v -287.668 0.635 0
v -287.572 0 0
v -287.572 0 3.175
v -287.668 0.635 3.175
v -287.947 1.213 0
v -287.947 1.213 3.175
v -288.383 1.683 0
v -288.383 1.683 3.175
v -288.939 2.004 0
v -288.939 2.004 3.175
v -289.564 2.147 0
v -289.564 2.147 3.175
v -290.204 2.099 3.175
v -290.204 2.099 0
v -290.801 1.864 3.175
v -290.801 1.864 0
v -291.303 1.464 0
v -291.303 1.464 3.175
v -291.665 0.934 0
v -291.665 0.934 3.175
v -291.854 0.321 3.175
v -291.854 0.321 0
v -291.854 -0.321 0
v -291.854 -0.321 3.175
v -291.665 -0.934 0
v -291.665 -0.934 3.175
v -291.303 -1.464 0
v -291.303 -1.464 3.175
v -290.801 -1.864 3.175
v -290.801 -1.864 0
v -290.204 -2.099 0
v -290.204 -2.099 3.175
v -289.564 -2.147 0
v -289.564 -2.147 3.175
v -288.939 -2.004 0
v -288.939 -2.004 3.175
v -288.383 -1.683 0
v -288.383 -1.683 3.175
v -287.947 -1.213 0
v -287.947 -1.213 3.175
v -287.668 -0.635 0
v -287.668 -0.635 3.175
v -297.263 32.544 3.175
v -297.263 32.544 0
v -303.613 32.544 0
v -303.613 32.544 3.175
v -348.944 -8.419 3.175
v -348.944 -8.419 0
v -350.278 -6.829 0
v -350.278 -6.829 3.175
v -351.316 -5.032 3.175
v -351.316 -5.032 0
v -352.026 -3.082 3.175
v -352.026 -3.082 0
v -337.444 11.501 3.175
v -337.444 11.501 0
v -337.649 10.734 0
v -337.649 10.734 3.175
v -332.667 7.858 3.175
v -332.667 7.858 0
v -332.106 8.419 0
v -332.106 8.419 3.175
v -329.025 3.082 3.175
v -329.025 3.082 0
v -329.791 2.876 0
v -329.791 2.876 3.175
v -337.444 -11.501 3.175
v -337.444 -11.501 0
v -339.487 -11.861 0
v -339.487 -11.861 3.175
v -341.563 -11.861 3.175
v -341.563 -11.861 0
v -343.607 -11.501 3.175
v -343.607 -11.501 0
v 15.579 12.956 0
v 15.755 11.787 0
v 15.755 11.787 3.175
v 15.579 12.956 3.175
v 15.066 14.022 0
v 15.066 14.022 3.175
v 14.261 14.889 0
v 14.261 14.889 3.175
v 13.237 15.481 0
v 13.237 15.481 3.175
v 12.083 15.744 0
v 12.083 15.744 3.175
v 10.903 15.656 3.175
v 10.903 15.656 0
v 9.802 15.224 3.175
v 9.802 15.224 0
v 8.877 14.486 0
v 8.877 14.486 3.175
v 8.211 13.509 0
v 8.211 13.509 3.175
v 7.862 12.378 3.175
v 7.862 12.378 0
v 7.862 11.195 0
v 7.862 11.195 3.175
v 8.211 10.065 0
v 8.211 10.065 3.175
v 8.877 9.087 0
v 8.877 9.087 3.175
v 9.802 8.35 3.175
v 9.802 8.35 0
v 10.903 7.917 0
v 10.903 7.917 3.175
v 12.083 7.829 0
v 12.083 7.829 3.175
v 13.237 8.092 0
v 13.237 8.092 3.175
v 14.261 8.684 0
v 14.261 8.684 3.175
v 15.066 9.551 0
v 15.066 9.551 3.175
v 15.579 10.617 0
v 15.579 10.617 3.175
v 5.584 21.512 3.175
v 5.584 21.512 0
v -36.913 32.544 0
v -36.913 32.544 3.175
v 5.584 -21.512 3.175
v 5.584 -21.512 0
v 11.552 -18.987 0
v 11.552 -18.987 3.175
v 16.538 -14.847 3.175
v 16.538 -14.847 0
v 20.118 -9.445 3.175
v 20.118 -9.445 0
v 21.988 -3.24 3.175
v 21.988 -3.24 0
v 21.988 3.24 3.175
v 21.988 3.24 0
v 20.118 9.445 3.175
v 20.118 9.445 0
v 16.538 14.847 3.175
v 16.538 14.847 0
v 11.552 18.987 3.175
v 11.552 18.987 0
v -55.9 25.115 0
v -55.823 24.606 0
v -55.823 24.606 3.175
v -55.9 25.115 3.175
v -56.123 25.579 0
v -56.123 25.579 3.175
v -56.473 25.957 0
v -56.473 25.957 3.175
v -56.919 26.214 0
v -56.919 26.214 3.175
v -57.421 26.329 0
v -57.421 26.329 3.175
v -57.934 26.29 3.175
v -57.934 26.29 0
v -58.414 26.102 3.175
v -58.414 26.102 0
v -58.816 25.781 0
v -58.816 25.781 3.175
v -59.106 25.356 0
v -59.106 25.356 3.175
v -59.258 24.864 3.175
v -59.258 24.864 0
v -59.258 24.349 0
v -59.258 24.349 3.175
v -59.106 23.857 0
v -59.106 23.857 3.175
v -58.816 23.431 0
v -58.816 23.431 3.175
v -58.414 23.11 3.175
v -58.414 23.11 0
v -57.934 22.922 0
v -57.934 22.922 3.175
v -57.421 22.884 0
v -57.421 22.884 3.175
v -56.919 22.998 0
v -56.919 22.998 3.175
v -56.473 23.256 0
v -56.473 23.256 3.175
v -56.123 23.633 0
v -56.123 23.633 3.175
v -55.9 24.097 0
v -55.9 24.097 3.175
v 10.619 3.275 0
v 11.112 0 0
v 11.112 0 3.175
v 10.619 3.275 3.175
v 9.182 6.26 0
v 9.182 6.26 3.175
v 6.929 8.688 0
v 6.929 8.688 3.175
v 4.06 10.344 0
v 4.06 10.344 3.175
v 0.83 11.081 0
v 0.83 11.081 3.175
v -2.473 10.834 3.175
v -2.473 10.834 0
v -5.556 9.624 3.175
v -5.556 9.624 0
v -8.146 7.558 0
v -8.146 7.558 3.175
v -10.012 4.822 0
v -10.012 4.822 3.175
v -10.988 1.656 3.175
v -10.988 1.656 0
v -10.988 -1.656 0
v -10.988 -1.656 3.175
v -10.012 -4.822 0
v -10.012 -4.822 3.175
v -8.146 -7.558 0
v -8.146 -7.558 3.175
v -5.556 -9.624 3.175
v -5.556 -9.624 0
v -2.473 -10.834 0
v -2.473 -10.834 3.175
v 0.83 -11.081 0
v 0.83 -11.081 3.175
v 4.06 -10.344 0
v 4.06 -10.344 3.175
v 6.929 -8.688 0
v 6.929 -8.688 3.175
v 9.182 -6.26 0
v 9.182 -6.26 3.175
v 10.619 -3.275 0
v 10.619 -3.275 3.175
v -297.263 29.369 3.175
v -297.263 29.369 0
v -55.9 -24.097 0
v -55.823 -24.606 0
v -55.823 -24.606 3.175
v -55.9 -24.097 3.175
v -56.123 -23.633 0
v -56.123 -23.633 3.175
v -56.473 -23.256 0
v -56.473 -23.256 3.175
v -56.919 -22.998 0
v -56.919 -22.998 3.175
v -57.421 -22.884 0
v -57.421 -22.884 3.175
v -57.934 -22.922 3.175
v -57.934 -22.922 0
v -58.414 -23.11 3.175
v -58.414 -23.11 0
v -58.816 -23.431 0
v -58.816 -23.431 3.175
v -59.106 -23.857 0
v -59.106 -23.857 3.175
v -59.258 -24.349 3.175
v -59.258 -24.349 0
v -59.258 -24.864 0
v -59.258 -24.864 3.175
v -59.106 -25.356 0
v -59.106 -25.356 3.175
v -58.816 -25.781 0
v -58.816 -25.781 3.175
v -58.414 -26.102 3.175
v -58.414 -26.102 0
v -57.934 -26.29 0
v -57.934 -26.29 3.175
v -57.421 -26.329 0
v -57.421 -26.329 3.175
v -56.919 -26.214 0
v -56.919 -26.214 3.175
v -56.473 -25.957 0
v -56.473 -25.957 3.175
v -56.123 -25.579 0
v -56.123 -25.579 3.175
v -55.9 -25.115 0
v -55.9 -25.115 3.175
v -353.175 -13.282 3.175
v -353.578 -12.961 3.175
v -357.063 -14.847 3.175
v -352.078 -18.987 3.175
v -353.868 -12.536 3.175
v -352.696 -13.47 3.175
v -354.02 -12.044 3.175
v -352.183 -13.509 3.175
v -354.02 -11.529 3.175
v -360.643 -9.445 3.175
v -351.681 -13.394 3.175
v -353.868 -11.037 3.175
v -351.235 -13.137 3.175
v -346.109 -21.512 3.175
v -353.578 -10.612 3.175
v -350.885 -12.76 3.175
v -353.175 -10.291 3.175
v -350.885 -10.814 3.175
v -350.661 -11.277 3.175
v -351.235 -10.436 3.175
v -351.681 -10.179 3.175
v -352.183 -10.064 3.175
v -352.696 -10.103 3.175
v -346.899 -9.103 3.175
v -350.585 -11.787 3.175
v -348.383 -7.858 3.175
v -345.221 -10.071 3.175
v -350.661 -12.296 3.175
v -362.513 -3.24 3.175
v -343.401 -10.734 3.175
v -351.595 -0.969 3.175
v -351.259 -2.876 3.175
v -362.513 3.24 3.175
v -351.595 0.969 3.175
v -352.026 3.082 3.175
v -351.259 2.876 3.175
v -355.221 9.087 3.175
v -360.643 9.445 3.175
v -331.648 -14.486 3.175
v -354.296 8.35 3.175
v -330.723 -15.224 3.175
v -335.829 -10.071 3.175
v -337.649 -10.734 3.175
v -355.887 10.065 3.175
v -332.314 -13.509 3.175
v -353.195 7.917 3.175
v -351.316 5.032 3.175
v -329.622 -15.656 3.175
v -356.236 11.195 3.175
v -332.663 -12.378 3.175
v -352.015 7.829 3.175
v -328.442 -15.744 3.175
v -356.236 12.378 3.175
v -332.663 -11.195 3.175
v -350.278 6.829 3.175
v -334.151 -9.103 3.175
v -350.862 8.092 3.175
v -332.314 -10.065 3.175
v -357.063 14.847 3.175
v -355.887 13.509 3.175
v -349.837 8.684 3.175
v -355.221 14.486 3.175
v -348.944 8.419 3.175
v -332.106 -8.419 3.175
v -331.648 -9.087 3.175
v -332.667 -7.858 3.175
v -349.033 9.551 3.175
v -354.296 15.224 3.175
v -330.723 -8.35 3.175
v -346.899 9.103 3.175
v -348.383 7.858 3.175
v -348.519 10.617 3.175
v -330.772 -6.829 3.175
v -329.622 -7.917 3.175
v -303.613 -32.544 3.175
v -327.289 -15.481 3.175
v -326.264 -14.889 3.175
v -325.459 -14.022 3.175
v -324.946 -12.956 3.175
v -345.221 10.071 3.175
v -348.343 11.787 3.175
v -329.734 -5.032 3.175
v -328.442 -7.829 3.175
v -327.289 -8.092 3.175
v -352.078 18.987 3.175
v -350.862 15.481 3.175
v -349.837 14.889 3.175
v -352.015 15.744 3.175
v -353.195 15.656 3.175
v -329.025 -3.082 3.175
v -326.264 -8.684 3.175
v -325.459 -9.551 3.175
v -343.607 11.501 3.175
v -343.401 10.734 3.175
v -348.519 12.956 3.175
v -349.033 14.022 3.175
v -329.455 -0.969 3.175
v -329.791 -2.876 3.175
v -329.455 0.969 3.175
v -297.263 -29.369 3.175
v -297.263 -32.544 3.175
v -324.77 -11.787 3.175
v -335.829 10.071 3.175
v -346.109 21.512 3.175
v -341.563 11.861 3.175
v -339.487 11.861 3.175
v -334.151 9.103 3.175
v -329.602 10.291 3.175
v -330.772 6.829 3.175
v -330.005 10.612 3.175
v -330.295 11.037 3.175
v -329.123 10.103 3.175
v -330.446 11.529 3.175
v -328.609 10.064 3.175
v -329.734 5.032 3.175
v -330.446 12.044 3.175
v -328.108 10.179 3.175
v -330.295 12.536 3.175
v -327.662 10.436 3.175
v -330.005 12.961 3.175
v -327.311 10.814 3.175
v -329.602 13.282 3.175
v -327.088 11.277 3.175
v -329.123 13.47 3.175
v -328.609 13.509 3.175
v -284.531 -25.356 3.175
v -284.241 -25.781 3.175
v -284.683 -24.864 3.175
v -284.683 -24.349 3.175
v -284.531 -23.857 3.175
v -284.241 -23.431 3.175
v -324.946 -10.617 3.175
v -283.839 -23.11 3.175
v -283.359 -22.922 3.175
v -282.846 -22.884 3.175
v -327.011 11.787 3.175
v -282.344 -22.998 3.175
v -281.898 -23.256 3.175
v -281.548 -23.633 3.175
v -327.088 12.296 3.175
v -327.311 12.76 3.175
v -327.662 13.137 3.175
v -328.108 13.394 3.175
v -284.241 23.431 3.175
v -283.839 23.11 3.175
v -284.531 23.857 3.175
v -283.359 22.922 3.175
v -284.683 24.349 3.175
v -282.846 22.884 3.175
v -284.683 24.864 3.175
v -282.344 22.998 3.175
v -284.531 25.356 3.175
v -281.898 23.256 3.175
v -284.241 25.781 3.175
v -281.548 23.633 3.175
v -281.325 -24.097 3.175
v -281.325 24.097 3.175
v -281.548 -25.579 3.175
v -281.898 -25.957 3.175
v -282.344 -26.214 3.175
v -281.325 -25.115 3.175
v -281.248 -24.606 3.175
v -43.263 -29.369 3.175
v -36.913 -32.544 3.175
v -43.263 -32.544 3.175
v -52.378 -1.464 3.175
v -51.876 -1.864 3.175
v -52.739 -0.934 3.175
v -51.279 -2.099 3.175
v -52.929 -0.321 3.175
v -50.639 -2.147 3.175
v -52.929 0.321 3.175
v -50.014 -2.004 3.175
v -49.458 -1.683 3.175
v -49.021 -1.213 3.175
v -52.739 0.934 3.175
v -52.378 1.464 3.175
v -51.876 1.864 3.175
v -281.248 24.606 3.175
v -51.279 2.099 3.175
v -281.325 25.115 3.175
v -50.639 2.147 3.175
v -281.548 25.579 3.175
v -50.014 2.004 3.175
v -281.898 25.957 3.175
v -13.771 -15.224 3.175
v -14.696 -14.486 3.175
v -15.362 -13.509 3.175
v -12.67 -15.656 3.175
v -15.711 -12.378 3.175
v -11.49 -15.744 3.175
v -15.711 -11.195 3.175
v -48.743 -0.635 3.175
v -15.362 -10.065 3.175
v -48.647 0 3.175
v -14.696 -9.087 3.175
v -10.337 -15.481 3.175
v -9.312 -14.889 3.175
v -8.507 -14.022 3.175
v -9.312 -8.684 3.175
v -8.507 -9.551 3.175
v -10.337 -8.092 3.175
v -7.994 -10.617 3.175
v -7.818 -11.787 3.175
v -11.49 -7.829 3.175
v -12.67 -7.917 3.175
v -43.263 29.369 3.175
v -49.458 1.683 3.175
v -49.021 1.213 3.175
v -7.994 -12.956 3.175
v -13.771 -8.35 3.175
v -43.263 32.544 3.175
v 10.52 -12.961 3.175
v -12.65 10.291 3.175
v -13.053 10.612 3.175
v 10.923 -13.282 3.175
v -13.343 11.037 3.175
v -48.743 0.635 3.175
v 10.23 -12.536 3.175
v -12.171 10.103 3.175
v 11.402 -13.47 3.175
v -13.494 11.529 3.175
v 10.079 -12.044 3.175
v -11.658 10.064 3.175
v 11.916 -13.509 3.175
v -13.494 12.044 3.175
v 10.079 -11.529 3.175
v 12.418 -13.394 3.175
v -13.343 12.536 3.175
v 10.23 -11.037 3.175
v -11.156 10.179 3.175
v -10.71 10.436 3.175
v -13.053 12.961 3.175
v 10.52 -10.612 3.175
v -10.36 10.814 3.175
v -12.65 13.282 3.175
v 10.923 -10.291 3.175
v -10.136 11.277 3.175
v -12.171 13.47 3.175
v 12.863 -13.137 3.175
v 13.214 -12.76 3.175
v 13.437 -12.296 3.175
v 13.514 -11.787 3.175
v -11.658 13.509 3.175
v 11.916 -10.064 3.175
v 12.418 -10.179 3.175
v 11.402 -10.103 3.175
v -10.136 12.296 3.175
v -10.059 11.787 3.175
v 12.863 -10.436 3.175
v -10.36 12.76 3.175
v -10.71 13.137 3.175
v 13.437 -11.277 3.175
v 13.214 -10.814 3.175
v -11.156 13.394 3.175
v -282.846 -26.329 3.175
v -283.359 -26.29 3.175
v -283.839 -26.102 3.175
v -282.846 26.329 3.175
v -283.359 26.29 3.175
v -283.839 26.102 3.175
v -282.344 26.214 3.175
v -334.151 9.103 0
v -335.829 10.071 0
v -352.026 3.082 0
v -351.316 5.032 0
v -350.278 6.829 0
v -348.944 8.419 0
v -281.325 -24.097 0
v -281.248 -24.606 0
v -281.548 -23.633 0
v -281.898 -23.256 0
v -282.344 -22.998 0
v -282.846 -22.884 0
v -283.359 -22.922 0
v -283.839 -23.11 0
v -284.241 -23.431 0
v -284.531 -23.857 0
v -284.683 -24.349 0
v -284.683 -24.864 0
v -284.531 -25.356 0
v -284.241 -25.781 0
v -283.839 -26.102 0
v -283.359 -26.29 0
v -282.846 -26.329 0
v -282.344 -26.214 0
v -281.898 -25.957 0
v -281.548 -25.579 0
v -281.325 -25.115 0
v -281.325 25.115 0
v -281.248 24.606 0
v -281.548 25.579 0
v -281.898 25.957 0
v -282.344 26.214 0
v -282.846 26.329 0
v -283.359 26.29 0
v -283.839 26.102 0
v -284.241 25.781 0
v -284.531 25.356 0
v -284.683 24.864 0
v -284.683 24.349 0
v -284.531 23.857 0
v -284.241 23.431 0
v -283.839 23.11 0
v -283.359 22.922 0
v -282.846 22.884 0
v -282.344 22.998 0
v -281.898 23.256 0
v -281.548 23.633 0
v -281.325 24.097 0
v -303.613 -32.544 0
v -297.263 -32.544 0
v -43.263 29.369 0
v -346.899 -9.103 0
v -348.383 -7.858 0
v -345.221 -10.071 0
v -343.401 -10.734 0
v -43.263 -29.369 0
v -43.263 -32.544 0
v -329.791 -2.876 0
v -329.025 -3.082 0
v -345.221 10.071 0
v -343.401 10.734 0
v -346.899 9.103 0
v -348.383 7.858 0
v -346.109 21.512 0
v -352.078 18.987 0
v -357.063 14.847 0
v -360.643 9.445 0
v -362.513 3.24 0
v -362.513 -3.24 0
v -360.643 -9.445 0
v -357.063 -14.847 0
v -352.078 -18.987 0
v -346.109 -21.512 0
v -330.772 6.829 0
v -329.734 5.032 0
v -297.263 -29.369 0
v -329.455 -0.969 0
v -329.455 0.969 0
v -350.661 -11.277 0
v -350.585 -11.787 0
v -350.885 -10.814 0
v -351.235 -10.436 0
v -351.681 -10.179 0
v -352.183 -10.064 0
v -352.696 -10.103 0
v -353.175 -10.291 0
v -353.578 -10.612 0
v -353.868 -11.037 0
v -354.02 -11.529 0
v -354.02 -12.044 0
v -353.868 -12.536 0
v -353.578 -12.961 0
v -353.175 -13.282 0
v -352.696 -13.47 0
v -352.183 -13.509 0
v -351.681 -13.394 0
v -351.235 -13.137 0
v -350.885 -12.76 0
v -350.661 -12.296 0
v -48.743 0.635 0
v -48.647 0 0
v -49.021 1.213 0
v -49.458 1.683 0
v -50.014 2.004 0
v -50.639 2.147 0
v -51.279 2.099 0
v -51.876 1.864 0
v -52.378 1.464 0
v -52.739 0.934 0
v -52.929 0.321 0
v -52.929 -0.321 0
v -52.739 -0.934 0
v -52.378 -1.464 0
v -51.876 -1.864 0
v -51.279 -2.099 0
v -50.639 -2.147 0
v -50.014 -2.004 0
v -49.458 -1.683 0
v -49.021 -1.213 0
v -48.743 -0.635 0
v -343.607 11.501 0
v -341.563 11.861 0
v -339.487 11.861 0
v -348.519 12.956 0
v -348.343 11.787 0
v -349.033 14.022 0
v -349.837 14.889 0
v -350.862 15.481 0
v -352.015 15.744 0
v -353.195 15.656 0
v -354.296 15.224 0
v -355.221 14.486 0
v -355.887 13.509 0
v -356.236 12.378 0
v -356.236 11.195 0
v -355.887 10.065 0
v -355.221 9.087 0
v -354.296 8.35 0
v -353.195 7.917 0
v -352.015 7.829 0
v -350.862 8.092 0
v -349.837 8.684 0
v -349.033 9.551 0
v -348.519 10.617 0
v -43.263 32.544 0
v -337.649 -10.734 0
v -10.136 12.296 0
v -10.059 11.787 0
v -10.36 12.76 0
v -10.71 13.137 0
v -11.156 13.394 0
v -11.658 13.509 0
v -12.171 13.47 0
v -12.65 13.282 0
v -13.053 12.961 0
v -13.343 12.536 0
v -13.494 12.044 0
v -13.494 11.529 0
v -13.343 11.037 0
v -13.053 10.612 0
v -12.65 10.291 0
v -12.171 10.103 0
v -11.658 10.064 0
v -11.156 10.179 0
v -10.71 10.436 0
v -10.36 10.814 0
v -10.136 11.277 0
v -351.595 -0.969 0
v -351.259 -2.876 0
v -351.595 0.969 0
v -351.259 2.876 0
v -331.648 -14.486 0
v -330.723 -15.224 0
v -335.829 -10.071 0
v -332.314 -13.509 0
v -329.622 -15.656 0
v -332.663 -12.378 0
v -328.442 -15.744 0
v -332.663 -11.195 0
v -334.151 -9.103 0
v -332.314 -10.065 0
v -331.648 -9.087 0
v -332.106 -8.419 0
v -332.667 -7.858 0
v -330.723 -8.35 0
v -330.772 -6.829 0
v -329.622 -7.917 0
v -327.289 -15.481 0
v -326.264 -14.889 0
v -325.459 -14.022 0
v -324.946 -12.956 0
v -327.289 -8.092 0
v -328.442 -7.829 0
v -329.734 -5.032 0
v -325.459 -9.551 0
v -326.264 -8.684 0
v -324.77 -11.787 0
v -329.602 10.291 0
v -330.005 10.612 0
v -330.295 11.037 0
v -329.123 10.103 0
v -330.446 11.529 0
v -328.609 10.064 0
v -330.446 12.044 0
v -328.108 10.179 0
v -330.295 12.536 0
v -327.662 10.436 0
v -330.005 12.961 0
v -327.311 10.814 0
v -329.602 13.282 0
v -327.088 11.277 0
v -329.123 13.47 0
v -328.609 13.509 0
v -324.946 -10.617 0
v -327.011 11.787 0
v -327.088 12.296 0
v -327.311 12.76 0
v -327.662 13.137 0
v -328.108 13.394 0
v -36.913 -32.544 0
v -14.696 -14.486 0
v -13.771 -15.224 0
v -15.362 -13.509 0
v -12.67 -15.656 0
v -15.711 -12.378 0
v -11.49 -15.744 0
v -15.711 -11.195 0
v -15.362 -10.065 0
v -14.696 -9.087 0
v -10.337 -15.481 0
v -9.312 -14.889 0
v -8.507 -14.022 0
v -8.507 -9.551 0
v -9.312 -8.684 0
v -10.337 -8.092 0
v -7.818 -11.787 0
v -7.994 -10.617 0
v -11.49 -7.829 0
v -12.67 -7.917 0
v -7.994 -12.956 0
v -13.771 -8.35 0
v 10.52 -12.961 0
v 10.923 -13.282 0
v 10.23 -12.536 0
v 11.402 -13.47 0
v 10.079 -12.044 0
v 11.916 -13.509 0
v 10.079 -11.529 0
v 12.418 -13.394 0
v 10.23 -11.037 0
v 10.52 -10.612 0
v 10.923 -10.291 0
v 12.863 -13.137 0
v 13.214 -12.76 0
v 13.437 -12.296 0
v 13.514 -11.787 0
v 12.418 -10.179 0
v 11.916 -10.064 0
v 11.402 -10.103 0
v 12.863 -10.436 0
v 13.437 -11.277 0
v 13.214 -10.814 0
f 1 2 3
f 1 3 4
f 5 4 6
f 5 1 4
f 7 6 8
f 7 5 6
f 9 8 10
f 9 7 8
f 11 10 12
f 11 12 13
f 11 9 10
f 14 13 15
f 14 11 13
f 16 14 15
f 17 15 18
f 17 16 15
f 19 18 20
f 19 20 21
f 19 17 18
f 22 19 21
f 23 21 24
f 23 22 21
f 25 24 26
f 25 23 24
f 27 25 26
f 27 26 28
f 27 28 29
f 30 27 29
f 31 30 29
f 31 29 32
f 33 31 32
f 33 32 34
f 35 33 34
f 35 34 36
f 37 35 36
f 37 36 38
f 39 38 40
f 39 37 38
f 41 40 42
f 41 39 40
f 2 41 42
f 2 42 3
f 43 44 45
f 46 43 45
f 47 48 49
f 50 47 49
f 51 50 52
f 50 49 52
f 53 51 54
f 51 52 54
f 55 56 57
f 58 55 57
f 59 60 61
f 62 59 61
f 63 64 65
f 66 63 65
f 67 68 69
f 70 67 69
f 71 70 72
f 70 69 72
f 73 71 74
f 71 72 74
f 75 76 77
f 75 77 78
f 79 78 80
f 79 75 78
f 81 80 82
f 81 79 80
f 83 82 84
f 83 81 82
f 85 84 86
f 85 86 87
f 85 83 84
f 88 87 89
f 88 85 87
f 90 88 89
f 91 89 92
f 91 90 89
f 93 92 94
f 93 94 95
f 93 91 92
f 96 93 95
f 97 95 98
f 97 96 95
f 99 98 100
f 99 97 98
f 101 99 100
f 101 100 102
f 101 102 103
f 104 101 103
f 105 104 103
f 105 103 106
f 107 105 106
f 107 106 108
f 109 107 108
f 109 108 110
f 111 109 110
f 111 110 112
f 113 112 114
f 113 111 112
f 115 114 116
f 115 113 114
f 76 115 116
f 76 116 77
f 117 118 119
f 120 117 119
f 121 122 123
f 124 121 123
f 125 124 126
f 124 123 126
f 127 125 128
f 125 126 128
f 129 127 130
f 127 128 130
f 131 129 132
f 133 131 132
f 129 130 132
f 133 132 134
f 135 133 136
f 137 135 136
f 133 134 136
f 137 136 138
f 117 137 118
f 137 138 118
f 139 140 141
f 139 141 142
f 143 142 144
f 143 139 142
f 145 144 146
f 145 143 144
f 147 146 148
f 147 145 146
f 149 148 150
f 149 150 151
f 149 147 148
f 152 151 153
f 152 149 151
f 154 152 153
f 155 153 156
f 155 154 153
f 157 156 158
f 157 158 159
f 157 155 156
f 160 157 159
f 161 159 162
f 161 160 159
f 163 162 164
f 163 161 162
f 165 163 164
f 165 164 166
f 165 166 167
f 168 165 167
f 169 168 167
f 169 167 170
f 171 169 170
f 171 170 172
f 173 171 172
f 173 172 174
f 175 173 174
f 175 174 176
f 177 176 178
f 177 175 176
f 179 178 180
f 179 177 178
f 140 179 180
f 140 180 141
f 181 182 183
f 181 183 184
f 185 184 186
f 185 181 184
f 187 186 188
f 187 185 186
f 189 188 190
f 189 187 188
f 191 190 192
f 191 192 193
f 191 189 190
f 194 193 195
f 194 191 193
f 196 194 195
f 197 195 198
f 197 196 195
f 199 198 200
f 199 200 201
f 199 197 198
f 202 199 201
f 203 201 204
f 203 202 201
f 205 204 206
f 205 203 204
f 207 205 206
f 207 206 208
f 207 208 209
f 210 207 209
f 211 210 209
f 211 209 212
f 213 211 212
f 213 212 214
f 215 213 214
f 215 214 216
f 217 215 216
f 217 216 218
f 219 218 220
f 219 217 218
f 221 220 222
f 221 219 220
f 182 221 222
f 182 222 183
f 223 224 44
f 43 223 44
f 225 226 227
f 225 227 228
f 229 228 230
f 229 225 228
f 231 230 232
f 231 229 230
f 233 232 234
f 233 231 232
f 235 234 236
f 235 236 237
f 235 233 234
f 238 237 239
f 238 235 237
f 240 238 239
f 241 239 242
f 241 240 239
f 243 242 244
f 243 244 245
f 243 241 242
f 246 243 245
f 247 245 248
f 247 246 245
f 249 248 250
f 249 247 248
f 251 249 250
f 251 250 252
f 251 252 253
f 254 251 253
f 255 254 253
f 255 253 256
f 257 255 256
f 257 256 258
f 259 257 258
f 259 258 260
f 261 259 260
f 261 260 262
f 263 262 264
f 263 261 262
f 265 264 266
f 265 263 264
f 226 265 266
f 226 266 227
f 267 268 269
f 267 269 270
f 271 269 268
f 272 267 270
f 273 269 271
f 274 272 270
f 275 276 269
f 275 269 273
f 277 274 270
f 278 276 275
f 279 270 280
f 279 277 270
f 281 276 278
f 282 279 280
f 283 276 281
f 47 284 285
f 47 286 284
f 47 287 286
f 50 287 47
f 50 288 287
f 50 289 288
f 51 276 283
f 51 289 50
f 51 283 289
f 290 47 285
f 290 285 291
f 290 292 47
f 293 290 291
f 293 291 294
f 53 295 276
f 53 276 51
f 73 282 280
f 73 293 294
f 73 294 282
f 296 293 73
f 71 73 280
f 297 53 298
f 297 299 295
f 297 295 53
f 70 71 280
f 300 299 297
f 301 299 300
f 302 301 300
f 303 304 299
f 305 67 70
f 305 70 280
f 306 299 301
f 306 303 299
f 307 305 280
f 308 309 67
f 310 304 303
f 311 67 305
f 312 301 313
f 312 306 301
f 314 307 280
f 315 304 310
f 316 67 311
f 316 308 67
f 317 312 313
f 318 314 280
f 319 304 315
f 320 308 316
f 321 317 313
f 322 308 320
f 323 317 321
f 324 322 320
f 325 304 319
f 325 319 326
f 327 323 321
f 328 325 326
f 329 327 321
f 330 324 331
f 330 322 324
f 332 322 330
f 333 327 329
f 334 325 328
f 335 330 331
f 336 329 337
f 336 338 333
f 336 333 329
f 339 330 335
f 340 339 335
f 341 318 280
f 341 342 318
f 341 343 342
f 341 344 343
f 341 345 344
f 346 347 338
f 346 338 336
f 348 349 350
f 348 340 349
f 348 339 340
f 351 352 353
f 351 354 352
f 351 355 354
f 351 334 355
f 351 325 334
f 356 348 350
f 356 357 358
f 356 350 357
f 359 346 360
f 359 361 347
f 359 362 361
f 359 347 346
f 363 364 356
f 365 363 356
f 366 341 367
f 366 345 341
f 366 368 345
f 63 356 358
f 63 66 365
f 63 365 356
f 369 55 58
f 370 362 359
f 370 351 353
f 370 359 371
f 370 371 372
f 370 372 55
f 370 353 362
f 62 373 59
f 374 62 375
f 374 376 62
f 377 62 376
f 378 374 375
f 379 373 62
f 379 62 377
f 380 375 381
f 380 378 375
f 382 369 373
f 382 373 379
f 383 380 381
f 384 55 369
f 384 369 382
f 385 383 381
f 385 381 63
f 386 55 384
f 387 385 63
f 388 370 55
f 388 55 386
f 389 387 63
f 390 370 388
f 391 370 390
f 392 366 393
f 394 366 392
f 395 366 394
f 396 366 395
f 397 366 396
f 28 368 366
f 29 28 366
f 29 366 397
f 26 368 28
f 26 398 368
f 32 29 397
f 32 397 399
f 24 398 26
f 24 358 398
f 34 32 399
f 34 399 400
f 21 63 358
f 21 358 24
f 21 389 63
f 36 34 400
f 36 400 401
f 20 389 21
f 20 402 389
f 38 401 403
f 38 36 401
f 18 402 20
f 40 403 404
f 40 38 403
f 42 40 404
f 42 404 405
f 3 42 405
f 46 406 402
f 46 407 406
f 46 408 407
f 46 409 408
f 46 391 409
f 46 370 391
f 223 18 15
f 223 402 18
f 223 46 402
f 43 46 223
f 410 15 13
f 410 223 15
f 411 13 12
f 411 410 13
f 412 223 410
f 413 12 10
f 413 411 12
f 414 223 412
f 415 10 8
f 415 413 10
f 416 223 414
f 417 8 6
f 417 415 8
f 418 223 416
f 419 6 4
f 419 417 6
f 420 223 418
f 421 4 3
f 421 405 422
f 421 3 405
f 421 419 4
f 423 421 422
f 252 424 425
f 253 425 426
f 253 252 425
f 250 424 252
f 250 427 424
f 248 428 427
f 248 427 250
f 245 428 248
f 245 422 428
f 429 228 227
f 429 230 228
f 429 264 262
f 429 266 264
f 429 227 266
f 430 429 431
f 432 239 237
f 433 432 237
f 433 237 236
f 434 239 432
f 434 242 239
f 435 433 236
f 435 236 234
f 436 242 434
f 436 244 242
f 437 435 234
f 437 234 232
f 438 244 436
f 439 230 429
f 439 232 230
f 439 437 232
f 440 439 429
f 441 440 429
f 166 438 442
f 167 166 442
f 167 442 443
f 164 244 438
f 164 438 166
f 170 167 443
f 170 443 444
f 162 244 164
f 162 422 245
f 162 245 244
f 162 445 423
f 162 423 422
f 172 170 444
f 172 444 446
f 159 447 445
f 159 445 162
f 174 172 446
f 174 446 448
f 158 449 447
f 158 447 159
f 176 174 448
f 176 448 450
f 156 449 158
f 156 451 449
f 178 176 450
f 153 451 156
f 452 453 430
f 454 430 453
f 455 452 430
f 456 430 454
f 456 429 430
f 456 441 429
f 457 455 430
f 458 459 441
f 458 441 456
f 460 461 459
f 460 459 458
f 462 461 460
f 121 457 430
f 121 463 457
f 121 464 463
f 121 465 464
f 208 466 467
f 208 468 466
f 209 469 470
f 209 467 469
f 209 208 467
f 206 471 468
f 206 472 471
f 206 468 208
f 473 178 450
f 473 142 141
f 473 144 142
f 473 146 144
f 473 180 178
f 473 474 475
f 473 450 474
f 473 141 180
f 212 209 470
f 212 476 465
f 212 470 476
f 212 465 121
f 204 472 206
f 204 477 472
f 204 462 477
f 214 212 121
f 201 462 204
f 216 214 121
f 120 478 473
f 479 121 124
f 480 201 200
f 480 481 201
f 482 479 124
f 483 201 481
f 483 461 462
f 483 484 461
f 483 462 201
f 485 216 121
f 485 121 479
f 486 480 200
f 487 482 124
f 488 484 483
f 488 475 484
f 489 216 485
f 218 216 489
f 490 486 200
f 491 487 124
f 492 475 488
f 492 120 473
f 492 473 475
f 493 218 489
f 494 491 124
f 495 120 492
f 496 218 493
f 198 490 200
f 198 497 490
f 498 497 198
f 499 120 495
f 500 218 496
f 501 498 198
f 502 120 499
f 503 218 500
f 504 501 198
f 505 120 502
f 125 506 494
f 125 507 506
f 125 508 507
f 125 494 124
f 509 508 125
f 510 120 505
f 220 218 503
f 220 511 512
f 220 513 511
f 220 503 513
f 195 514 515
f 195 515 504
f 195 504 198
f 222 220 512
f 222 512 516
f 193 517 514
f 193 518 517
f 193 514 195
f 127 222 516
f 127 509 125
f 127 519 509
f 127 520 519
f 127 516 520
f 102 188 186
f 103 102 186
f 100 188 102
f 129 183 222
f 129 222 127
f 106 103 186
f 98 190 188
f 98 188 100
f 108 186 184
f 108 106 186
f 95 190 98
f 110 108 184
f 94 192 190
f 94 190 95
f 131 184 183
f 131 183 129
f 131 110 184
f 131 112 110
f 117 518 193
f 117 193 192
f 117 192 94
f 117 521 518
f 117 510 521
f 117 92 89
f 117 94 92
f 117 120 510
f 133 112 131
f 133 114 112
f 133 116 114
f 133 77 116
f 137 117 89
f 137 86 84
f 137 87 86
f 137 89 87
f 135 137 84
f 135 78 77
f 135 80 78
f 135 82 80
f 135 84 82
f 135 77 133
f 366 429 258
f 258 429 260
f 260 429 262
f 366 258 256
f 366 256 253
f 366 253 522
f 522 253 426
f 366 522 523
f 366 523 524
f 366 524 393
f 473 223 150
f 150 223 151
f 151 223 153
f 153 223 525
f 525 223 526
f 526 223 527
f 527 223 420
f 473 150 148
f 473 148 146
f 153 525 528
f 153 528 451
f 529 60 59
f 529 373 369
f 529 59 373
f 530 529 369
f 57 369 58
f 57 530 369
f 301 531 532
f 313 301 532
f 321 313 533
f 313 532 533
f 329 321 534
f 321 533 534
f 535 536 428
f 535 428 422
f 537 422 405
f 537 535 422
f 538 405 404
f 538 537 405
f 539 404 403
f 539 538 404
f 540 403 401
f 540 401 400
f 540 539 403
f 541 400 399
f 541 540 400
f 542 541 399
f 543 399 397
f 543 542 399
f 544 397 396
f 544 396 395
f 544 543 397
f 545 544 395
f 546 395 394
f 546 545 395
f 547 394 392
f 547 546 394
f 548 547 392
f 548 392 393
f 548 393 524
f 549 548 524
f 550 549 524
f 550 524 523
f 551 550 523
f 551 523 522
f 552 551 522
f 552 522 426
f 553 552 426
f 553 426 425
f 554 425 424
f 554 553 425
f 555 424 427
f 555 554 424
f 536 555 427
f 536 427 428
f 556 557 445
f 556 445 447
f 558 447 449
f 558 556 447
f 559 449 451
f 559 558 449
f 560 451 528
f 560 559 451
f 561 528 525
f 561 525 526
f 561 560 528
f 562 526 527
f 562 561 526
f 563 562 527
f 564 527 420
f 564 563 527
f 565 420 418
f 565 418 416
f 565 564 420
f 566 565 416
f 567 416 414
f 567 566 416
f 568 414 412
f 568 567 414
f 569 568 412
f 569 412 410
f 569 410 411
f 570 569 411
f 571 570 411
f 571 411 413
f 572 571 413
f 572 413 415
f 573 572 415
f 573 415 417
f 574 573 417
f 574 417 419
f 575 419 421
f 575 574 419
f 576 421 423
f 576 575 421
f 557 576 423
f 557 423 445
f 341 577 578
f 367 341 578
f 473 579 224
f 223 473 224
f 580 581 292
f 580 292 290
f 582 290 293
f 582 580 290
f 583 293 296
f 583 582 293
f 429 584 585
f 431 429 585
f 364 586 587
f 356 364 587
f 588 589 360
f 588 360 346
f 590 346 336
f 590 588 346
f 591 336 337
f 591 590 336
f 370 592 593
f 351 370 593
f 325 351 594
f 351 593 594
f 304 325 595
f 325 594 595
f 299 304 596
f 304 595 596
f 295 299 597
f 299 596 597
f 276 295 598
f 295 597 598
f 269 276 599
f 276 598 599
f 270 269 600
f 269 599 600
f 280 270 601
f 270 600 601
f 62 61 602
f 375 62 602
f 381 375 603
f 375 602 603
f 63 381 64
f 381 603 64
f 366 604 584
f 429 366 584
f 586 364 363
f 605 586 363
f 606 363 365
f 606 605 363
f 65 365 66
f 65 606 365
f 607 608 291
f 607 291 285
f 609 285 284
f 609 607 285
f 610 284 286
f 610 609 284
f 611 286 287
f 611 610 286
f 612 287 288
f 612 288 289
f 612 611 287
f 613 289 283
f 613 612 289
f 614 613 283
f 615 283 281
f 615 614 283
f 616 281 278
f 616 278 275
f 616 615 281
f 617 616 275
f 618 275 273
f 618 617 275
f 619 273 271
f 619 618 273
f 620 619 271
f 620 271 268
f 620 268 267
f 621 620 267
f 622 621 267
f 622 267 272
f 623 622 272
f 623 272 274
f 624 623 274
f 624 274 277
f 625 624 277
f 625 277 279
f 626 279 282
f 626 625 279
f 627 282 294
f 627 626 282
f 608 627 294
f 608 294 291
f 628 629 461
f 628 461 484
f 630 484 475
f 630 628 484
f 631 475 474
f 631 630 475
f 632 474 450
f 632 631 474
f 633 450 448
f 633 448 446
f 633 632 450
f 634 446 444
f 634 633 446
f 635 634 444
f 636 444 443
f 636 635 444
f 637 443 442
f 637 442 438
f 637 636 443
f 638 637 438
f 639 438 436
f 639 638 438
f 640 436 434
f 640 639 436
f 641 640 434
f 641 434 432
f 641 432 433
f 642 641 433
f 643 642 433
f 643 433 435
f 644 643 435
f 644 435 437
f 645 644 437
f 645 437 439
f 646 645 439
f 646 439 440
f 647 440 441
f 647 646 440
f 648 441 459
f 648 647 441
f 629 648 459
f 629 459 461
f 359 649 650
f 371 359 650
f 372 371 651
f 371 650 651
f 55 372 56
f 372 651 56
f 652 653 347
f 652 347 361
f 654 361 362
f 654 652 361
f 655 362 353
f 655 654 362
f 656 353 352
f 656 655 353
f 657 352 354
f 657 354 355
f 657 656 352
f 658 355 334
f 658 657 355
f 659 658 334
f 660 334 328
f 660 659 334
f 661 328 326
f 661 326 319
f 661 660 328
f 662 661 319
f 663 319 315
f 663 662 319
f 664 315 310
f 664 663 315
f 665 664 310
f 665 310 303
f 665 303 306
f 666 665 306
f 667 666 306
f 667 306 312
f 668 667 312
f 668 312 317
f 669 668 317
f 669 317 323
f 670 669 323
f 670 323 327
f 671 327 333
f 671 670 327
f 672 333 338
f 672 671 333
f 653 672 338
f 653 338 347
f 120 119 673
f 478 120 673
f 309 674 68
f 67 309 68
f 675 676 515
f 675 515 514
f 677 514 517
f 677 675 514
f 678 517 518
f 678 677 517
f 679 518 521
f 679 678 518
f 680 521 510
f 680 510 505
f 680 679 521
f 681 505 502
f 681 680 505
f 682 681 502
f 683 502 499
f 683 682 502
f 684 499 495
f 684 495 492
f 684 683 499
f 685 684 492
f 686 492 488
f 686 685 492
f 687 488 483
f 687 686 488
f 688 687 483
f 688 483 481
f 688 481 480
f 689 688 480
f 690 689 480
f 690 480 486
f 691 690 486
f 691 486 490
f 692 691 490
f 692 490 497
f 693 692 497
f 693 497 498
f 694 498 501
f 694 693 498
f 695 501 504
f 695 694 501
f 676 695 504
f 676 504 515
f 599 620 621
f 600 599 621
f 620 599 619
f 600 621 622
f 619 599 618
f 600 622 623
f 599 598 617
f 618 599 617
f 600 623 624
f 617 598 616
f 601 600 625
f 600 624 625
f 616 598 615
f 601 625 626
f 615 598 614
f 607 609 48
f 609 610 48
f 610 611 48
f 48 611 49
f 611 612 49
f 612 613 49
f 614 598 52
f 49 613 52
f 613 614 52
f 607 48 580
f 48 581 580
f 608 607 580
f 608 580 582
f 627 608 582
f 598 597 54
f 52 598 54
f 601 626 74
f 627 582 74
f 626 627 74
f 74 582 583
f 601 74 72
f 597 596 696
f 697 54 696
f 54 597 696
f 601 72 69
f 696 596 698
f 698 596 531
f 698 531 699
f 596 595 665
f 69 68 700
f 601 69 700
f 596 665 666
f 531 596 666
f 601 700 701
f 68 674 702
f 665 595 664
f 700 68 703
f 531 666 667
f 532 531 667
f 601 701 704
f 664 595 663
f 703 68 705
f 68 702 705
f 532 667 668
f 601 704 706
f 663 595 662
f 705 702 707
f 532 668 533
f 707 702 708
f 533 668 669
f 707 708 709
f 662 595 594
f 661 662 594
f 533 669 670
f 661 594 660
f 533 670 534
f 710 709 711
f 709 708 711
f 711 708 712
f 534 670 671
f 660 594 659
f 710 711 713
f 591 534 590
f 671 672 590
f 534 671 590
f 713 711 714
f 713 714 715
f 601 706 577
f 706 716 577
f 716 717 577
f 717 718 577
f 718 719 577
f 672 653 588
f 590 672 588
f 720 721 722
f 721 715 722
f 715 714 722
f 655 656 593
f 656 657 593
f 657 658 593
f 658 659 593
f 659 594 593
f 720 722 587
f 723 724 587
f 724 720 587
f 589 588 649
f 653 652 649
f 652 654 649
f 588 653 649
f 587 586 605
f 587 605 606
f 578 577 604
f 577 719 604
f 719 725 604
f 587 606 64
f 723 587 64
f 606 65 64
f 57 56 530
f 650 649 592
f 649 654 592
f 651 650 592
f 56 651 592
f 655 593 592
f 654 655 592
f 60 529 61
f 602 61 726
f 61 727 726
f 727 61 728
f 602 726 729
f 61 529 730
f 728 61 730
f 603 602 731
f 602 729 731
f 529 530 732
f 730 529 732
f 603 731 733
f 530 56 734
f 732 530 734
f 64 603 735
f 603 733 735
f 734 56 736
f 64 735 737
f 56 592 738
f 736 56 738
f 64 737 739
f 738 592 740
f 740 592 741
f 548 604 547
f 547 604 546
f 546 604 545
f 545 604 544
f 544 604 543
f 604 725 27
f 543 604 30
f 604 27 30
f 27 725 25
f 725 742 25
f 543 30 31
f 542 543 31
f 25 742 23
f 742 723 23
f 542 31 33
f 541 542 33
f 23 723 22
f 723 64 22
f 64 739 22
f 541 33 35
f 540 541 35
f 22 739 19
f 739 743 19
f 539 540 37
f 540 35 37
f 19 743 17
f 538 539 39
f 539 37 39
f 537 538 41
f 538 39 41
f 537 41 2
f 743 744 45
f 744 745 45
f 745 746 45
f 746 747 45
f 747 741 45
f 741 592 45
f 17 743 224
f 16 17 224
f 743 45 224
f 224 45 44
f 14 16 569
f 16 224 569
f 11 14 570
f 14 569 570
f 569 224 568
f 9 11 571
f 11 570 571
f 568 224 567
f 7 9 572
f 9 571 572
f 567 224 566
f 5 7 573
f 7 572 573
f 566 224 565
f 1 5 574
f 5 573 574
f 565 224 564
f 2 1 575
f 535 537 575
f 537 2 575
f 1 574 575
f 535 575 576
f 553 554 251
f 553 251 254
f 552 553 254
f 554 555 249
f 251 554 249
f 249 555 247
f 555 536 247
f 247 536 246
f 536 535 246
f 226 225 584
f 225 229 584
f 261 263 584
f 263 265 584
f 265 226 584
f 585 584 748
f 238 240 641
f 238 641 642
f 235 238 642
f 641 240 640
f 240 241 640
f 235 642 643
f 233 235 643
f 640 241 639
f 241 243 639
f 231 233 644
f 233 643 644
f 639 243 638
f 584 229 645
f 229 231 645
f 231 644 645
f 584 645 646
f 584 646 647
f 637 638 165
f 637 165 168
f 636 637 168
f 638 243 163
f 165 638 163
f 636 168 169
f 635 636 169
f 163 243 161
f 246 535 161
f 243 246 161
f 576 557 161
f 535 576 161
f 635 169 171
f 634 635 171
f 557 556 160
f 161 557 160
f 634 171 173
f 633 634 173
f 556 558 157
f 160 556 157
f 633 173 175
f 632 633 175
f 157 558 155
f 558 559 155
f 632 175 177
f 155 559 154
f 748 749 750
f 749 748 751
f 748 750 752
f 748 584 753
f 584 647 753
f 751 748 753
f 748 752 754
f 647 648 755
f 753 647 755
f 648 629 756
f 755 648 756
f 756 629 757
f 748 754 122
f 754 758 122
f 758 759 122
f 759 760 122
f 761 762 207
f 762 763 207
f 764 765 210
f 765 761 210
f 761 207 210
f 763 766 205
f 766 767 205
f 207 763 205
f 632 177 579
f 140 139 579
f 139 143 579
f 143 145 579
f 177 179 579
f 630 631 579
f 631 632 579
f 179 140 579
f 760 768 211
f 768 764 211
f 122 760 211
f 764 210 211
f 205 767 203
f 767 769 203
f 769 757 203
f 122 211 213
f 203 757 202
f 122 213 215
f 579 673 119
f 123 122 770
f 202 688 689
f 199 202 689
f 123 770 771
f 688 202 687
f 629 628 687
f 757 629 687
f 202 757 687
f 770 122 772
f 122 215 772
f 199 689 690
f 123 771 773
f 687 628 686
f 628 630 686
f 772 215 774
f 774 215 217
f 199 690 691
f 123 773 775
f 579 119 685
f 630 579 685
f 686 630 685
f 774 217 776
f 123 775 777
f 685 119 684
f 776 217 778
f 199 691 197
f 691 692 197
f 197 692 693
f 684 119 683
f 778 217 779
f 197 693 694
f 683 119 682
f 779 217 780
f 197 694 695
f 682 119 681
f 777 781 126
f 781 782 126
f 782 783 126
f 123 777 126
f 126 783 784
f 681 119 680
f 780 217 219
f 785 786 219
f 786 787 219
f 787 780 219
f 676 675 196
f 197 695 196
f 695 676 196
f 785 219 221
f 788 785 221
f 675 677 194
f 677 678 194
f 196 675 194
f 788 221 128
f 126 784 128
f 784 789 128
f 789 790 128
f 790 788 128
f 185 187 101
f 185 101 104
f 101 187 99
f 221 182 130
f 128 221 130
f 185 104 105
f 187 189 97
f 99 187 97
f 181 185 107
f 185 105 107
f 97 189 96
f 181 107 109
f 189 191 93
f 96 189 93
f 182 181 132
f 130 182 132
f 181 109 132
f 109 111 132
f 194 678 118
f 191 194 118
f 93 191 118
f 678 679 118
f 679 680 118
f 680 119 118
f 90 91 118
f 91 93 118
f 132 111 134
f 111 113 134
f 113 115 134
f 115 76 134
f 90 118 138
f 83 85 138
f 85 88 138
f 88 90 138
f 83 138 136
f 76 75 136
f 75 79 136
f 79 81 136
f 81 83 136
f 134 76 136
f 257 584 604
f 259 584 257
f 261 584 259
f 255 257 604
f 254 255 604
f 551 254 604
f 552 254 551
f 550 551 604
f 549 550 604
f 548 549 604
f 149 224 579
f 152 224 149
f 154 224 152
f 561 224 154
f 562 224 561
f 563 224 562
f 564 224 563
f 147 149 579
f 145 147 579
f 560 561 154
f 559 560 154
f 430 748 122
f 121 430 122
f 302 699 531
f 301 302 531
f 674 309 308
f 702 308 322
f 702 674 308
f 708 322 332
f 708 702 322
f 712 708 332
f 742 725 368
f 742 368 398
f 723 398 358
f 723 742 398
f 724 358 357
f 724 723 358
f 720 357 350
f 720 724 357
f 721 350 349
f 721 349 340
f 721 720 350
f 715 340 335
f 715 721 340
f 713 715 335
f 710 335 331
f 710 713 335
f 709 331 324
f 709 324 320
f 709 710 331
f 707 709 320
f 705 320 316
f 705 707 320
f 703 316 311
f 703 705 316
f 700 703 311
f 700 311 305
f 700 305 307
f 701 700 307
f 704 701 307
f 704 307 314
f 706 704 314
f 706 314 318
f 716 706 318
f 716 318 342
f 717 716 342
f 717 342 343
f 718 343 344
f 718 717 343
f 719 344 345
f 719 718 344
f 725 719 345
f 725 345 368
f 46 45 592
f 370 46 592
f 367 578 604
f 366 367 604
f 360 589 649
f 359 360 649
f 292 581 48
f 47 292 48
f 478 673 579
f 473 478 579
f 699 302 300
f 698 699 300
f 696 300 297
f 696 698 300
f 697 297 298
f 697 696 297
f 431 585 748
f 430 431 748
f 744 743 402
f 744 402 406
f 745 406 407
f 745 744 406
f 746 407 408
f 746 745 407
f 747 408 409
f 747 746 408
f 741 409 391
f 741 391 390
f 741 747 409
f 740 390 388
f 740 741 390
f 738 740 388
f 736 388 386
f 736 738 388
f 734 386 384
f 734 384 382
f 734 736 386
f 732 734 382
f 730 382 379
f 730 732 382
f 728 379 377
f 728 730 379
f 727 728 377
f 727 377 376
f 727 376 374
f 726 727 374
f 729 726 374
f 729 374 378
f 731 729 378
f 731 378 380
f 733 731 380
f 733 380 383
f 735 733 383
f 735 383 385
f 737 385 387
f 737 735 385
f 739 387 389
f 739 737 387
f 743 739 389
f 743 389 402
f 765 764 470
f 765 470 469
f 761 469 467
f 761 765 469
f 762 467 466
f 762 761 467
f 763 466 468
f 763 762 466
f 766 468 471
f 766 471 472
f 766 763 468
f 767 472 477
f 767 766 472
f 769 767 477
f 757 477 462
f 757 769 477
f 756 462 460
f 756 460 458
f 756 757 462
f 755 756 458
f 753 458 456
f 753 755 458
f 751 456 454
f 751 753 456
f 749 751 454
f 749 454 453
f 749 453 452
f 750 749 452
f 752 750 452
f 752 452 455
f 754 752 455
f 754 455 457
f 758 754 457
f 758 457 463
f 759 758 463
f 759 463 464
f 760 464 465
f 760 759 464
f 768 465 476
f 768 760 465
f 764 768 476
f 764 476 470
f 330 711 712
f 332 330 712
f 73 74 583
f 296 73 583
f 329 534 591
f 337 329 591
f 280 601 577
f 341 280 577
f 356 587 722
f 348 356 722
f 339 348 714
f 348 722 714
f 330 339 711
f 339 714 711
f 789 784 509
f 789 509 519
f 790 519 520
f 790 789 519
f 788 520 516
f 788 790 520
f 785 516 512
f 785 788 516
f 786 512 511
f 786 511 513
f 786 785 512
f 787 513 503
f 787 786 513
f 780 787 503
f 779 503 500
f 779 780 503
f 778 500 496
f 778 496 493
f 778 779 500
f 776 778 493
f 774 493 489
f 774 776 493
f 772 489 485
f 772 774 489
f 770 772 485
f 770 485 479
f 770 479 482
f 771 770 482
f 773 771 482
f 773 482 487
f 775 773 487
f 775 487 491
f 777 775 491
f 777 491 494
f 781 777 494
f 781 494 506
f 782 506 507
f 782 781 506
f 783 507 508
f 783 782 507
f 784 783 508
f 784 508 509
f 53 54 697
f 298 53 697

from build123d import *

# Parameters (mm, degrees)
F0_R     = 1.7272
F0_R_2   = 3.96875
F0_R_3   = 11.1125
F0_R_4   = 2.15265
F1_DEPTH = 3.175
F3_DEPTH = 3.175
F4_COUNT = 6
F4_ANGLE = 300


with BuildPart() as f1:
    # F0 (on Top) → F1 (new body)
    with BuildSketch(Plane.XY):
        with BuildLine():
            Line((-303.6125627, 32.54375), (-346.1094200534, 21.5120031198))
            ThreePointArc((-346.1094200534, 21.5120031198), (-362.7501254, 0), (-346.1094200534, -21.5120031198))
            Line((-346.1094200534, -21.5120031198), (-303.6125627, -32.54375))
            Line((-303.6125627, -32.54375), (-297.2625627, -32.54375))
            Line((-297.2625627, -32.54375), (-297.2625627, -29.36875))
            Line((-297.2625627, -29.36875), (-43.2625627, -29.36875))
            Line((-43.2625627, -29.36875), (-43.2625627, -32.54375))
            Line((-43.2625627, -32.54375), (-36.9125627, -32.54375))
            Line((-36.9125627, -32.54375), (5.5842946534, -21.5120031198))
            ThreePointArc((5.5842946534, -21.5120031198), (22.225, 0), (5.5842946534, 21.5120031198))
            Line((5.5842946534, 21.5120031198), (-36.9125627, 32.54375))
            Line((-36.9125627, 32.54375), (-43.2625627, 32.54375))
            Line((-43.2625627, 32.54375), (-43.2625627, 29.36875))
            Line((-43.2625627, 29.36875), (-297.2625627, 29.36875))
            Line((-297.2625627, 29.36875), (-297.2625627, 32.54375))
            Line((-297.2625627, 32.54375), (-303.6125627, 32.54375))
        make_face()
        with Locations((-282.9750627, -24.60625)):
            Circle(F0_R, mode=Mode.SUBTRACT)
        with Locations((-352.3117115589, -11.7865861589)):
            Circle(F0_R, mode=Mode.SUBTRACT)
        with Locations((-328.7385392411, -11.7865861589)):
            Circle(F0_R_2, mode=Mode.SUBTRACT)
        with Locations((-57.5500627, -24.60625)):
            Circle(F0_R, mode=Mode.SUBTRACT)
        with Locations((-11.7865861589, -11.7865861589)):
            Circle(F0_R_2, mode=Mode.SUBTRACT)
        with Locations((11.7865861589, -11.7865861589)):
            Circle(F0_R, mode=Mode.SUBTRACT)
        with Locations((-340.5251254, 0)):
            Circle(F0_R_3, mode=Mode.SUBTRACT)
        with Locations((-289.7251254, 0)):
            Circle(F0_R_4, mode=Mode.SUBTRACT)
        with Locations((-352.3117115589, 11.7865861589)):
            Circle(F0_R_2, mode=Mode.SUBTRACT)
        with Locations((-328.7385392411, 11.7865861589)):
            Circle(F0_R, mode=Mode.SUBTRACT)
        with Locations((-282.9750627, 24.60625)):
            Circle(F0_R, mode=Mode.SUBTRACT)
        with Locations((-50.8, 0)):
            Circle(F0_R_4, mode=Mode.SUBTRACT)
        Circle(F0_R_3, mode=Mode.SUBTRACT)
        with Locations((-11.7865861589, 11.7865861589)):
            Circle(F0_R, mode=Mode.SUBTRACT)
        with Locations((11.7865861589, 11.7865861589)):
            Circle(F0_R_2, mode=Mode.SUBTRACT)
        with Locations((-57.5500627, 24.60625)):
            Circle(F0_R, mode=Mode.SUBTRACT)
    extrude(amount=F1_DEPTH)

    # F2 (on face) → F3 (cut, through all)
    with BuildSketch(Plane(origin=(0, 0, 0), x_dir=(1, 0, 0), z_dir=(0, 0, -1))):
        with BuildLine():
            ThreePointArc((-348.3828495059, -7.8577241059), (-350.1488326996, -5.55625), (-351.2589761446, -2.8761266387))
            Line((-351.2589761446, -2.8761266387), (-352.0256797693, -3.0815642558))
            ThreePointArc((-352.0256797693, -3.0815642558), (-350.8362403638, -5.953125), (-348.9441155135, -8.4189901135))
            Line((-348.9441155135, -8.4189901135), (-348.3828495059, -7.8577241059))
        make_face()
    f3 = extrude(amount=-F3_DEPTH, mode=Mode.SUBTRACT)

    # F4: F3 ×6 about axis
    f4_axis = Axis((-340.5251254, 0, 0), (0, 0, -1))
    for i in range(1, F4_COUNT):
        add(f3.rotate(f4_axis, i * F4_ANGLE / (F4_COUNT - 1)), mode=Mode.SUBTRACT)


solid = f1.part
